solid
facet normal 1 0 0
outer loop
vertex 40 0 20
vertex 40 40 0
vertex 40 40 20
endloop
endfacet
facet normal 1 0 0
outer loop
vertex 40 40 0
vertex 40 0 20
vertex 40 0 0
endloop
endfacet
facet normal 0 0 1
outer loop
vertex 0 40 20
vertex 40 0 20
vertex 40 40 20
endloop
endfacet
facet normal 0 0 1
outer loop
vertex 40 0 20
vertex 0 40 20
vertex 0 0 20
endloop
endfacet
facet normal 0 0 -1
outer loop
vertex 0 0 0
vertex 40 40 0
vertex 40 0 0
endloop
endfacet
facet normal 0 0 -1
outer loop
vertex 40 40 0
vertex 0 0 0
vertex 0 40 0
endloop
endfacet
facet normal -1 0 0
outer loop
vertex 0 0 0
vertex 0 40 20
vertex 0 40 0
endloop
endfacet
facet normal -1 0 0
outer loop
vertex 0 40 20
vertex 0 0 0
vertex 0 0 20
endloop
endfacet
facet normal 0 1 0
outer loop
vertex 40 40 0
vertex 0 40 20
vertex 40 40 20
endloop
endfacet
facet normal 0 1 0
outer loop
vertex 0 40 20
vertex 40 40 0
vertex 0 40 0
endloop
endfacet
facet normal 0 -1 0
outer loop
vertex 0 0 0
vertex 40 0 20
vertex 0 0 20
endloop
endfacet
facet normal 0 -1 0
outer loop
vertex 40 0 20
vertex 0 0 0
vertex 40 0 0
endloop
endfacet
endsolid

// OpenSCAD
// Parameters
block_size = 40;       // Width and depth of the block
block_height = 20;     // Height of the block
hollow_depth = 10;     // Depth of the hollow (inverted pyramid)
wall_thickness = 0.1;  // Small offset to ensure proper subtraction

module hollow_block() {
    difference() {
        // Outer solid block
        cube([block_size, block_size, block_height], center=false);

        // Inverted pyramid hollow
        translate([0, 0, block_height - hollow_depth])
            polyhedron(
                points=[
                    [0, 0, 0],
                    [block_size, 0, 0],
                    [block_size, block_size, 0],
                    [0, block_size, 0],
                    [block_size/2, block_size/2, hollow_depth + wall_thickness]
                ],
                faces=[
                    [0, 1, 4],
                    [1, 2, 4],
                    [2, 3, 4],
                    [3, 0, 4],
                    [0, 1, 2, 3]
                ]
            );
    }
}

// Render the model
hollow_block();
